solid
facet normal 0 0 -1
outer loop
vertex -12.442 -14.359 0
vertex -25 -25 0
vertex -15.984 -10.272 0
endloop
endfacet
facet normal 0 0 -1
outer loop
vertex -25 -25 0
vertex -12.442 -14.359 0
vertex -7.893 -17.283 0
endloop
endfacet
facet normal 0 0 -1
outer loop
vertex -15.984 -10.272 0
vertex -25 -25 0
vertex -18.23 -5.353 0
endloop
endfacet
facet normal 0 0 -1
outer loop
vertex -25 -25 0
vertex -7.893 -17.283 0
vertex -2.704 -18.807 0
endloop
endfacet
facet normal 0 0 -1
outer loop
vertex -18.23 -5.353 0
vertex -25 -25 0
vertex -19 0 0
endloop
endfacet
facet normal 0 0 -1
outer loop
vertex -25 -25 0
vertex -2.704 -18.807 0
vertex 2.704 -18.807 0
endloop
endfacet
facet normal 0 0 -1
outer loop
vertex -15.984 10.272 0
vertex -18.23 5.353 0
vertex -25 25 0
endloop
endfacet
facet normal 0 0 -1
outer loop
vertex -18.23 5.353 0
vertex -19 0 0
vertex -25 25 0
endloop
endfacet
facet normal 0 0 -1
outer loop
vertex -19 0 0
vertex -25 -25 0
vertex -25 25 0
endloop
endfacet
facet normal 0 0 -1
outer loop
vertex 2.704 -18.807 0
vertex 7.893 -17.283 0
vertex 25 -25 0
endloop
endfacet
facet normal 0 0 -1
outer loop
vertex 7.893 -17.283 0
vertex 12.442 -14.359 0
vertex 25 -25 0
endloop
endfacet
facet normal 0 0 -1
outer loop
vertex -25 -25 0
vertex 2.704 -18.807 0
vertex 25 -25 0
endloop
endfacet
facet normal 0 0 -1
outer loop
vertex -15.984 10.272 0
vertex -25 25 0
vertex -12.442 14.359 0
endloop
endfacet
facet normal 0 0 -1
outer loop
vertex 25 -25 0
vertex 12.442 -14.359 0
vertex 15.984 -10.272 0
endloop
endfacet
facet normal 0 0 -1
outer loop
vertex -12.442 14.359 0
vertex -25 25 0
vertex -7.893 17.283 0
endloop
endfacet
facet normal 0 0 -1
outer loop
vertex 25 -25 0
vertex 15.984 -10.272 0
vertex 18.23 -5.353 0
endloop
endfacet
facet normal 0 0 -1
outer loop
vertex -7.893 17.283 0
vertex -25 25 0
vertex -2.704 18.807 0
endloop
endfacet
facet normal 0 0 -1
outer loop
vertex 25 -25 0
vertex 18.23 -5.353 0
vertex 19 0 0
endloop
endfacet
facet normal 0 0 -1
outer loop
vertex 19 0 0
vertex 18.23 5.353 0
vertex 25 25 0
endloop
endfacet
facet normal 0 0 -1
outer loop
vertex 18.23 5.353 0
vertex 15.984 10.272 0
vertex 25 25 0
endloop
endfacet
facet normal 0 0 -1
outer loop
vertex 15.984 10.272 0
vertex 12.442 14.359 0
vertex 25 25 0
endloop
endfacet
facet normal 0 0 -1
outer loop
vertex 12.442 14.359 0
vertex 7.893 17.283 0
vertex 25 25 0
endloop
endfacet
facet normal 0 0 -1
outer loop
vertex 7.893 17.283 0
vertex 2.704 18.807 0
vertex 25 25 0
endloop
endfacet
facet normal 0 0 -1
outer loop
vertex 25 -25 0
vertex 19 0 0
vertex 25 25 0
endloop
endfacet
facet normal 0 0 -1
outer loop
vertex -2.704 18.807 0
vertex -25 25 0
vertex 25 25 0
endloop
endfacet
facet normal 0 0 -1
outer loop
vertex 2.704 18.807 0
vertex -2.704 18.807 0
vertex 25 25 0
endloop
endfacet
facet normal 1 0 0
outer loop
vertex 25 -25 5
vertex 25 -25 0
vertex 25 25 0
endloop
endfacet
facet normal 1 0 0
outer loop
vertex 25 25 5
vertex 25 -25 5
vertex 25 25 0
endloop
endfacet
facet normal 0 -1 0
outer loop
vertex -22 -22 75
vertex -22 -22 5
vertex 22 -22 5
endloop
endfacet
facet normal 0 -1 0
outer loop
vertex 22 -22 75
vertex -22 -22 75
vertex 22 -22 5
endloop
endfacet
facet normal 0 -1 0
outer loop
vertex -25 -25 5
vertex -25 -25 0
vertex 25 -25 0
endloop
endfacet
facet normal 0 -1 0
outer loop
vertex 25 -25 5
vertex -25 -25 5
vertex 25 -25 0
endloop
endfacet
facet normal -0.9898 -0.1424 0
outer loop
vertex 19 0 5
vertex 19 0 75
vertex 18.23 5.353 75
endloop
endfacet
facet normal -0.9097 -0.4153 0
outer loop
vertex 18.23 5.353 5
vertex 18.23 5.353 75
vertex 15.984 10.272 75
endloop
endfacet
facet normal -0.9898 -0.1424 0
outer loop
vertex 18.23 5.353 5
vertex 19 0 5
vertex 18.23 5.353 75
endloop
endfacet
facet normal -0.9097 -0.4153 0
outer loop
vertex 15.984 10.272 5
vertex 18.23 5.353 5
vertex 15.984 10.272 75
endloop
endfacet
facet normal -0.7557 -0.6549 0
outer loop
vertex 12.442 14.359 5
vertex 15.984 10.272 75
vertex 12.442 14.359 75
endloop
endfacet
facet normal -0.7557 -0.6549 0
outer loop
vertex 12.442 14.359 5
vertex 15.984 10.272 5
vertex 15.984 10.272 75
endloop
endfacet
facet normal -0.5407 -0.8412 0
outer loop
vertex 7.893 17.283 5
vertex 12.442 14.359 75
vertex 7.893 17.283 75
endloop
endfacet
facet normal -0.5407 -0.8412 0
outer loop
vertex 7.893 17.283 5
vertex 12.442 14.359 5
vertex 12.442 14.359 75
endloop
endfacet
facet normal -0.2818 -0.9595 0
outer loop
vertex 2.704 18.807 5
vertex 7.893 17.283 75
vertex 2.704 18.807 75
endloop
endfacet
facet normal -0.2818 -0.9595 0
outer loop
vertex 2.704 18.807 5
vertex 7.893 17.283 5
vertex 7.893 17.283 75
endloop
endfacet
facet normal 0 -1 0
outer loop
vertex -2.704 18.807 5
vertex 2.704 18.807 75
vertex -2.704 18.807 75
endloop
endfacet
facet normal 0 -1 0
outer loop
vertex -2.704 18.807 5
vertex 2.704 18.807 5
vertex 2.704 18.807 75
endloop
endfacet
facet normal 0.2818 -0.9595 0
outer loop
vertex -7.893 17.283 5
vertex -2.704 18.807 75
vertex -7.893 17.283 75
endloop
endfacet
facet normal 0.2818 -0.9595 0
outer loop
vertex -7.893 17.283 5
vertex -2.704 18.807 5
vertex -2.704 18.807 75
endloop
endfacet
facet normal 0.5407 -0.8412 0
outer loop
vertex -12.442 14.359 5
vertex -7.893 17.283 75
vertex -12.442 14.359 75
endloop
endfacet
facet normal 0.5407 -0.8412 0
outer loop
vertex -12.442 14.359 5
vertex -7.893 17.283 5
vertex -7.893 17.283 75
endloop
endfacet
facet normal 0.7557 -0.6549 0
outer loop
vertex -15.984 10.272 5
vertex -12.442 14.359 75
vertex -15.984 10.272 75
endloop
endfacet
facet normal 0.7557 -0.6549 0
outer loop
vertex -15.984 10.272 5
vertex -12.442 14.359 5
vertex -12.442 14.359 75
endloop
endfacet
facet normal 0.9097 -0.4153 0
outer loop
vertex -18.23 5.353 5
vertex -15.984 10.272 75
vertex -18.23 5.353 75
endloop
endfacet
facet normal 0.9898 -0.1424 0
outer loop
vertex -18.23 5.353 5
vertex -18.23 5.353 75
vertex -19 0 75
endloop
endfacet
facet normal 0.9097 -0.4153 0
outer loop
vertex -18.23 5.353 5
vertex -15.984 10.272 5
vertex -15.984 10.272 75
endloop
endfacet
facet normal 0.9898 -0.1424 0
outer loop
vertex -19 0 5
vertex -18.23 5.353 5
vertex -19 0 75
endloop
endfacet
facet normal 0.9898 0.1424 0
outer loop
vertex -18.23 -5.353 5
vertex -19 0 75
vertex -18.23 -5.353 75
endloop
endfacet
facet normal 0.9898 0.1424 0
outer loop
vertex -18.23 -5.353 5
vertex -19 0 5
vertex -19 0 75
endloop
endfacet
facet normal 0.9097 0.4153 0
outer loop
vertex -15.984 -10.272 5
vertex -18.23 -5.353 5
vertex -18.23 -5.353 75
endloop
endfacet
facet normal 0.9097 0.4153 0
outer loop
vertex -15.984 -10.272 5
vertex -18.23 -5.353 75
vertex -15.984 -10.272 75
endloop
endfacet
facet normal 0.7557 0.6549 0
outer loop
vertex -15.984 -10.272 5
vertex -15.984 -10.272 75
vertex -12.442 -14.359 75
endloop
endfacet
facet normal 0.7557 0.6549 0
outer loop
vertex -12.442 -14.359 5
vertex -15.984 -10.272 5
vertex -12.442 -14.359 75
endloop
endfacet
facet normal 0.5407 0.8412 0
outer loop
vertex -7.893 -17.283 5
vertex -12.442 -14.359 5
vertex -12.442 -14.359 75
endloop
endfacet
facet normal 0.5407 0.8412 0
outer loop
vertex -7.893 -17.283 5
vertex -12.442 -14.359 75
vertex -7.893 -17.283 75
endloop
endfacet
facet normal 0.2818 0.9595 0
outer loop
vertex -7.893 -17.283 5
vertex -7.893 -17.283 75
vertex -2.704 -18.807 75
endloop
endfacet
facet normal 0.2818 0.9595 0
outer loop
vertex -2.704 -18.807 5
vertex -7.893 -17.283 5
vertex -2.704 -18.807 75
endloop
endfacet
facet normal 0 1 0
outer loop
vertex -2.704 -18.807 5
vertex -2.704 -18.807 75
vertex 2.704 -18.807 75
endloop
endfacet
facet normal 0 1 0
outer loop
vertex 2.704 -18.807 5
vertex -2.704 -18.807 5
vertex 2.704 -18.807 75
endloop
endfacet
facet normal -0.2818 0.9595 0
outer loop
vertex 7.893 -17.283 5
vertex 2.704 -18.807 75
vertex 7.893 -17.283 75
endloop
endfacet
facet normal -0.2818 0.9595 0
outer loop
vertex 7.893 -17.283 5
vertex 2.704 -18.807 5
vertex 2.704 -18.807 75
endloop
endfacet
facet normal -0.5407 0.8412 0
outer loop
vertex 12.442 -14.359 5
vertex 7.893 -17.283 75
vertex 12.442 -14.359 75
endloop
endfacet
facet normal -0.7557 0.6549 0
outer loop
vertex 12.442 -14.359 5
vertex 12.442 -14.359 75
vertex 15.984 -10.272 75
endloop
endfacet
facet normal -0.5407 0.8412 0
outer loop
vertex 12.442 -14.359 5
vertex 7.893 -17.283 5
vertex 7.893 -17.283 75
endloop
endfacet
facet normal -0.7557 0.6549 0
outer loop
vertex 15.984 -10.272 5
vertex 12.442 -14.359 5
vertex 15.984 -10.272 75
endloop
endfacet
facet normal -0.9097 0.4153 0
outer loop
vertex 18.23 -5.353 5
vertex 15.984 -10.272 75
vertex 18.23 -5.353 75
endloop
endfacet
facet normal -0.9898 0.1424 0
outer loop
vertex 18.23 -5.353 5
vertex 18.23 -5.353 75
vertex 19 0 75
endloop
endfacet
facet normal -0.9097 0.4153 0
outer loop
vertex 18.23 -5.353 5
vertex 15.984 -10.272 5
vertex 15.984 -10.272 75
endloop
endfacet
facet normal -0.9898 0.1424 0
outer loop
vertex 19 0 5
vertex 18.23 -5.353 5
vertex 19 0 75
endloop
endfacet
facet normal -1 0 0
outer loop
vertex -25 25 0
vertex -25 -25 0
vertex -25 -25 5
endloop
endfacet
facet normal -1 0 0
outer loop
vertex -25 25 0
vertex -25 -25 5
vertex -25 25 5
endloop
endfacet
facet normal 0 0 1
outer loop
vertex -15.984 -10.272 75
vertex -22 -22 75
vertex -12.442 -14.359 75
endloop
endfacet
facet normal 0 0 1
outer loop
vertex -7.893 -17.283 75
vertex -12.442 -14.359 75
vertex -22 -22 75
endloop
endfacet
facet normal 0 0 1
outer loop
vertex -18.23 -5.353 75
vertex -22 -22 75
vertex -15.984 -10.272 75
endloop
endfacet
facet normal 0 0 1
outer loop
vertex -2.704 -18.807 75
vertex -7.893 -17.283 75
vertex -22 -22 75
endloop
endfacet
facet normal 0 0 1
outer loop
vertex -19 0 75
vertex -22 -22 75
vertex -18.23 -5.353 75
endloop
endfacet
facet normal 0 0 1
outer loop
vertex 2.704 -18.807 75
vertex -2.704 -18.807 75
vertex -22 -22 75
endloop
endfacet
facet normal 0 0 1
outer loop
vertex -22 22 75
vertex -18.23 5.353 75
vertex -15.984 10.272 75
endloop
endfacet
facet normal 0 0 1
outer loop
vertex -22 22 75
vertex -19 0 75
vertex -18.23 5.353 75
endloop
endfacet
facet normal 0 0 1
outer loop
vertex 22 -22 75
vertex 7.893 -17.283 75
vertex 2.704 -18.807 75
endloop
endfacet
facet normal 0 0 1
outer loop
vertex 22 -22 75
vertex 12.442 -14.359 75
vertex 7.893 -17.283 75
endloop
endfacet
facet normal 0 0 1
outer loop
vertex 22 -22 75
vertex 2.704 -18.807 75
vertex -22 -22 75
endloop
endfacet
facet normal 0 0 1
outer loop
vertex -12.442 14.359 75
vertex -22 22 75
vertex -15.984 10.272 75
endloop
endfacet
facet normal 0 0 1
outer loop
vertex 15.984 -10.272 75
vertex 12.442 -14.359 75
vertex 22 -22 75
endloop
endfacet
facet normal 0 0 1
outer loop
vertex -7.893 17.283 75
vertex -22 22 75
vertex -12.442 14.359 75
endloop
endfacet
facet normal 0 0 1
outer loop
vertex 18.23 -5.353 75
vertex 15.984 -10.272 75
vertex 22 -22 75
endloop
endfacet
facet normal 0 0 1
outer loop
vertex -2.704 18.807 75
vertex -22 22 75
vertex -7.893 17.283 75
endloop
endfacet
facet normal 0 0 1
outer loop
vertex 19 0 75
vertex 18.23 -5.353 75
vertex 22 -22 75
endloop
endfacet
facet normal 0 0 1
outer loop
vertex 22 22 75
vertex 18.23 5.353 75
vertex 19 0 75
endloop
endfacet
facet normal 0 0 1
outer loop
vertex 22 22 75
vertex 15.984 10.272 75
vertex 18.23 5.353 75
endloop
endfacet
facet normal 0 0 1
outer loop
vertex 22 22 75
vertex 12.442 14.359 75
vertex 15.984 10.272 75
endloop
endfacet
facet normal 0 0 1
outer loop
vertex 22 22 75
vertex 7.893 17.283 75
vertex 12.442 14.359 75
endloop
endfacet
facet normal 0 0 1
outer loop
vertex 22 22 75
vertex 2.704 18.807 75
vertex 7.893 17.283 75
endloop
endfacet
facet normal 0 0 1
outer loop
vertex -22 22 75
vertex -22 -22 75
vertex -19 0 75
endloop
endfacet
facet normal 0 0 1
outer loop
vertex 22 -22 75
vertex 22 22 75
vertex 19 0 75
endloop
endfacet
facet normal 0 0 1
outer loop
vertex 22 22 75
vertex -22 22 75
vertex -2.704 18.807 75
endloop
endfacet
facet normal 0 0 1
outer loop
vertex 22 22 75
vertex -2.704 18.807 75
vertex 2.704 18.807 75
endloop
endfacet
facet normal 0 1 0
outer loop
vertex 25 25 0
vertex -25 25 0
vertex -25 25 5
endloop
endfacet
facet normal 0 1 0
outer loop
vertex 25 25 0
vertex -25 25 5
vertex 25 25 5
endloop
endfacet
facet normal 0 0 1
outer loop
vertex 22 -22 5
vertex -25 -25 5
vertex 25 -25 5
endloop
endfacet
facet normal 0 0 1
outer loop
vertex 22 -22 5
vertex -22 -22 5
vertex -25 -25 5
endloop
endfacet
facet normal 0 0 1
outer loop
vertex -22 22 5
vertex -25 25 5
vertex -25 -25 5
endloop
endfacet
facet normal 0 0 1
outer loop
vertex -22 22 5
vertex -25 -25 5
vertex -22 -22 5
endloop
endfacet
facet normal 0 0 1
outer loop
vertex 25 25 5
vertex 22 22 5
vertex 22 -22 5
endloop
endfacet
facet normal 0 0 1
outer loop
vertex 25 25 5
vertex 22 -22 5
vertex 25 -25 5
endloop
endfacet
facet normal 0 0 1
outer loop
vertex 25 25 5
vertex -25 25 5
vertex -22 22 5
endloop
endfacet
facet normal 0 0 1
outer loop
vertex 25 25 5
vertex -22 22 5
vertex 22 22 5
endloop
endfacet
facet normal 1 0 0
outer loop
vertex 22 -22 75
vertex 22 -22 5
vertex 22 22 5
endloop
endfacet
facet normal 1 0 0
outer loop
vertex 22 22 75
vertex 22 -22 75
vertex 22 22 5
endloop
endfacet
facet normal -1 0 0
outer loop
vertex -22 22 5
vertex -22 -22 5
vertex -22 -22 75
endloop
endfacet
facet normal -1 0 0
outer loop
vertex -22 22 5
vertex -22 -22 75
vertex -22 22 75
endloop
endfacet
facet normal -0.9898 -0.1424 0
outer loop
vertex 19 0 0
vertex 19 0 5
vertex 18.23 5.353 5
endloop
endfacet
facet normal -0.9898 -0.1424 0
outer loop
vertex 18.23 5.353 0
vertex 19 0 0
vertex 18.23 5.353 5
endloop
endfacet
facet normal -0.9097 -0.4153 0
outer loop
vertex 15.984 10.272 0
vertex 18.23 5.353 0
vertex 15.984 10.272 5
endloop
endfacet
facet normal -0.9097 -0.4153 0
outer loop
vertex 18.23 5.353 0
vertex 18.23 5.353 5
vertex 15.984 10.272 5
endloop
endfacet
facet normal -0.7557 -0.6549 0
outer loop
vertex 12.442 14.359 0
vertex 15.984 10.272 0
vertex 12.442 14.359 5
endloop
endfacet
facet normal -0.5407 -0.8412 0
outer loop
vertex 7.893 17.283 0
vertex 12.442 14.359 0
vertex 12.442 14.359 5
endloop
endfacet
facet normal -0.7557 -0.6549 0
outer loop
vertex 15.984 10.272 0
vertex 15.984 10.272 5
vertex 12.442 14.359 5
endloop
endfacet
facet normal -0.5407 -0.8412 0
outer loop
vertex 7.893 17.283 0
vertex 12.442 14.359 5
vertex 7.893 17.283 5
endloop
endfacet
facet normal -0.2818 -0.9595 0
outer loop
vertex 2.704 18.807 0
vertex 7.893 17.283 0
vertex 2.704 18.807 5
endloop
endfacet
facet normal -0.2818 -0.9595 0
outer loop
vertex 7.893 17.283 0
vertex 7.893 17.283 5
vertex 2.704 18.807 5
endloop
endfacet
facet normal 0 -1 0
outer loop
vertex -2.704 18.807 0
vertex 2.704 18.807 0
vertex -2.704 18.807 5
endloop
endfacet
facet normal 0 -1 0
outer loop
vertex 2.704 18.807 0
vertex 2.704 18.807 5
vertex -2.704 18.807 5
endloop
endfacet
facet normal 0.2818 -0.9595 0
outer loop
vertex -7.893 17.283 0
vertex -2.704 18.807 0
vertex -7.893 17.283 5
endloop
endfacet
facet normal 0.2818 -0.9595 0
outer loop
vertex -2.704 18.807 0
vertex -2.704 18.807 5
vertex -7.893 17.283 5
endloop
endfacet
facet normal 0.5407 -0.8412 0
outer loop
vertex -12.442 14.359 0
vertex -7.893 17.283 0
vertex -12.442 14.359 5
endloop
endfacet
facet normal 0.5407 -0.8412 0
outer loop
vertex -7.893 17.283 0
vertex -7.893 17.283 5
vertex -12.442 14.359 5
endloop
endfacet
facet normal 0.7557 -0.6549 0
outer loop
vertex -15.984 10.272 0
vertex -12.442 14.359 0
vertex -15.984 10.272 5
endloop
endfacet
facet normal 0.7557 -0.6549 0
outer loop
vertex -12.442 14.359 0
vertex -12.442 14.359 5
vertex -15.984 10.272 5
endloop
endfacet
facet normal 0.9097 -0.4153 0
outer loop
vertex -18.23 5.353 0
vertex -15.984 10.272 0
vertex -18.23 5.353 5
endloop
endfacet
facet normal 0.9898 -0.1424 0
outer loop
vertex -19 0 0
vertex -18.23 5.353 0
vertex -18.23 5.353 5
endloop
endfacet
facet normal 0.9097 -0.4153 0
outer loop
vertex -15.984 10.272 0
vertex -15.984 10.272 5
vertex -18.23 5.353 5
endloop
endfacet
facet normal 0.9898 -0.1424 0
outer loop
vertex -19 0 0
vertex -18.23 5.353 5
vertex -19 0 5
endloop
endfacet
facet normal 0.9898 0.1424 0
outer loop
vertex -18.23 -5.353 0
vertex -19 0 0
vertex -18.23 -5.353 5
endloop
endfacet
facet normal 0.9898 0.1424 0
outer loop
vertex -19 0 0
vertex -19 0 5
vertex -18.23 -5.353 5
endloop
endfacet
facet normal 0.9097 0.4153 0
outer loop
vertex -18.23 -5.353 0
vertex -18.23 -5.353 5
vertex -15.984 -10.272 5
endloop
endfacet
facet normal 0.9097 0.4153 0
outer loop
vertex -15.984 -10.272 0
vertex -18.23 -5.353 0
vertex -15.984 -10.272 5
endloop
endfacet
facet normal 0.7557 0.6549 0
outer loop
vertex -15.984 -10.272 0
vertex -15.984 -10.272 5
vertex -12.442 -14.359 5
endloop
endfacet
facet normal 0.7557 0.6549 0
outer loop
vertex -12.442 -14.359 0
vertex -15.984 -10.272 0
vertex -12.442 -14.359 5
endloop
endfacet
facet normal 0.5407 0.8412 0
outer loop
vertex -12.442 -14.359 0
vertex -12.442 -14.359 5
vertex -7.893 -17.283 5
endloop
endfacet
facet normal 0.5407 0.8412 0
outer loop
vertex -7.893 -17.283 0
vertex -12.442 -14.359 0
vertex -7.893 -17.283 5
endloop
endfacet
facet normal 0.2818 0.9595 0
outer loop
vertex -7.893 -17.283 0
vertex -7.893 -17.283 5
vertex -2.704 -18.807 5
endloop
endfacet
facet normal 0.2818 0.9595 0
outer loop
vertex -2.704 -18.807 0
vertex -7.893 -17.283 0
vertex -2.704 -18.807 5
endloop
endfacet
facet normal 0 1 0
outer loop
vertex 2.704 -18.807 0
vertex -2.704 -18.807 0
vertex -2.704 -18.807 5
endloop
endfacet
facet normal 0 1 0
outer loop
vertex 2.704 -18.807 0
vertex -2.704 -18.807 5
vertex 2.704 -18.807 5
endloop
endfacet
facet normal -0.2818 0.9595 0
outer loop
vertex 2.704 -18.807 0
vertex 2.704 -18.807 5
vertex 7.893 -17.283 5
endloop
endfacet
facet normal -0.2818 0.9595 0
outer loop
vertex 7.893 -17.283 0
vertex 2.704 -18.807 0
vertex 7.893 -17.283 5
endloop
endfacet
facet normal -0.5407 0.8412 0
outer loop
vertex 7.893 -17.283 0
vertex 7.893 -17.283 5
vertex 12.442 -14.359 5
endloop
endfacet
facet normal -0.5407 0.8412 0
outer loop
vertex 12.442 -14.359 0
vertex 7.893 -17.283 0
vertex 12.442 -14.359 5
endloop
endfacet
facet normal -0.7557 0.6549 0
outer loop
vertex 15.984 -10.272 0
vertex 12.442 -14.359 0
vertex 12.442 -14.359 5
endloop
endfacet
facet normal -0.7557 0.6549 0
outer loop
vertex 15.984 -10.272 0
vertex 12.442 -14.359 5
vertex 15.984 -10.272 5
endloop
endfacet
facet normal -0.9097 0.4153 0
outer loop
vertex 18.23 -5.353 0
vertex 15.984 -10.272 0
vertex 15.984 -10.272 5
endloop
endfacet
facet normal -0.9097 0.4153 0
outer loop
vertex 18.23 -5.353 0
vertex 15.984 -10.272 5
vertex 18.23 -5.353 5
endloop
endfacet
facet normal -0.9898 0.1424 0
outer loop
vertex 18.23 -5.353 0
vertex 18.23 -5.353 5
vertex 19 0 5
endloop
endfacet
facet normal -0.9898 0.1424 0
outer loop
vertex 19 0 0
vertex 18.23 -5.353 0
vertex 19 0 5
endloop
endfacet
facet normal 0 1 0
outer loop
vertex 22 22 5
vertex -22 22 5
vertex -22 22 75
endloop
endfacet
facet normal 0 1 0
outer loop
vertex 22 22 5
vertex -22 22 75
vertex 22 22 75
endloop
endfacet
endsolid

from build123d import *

# Parameters (mm, degrees)
F0_W      = 50
F0_H      = 50
F1_DEPTH  = 5
F2_W      = 44
F2_H      = 44
F2_R      = 19
F3_DEPTH  = 70
F3_FACE_R = 19
F4_DEPTH  = 78.5


with BuildPart() as f1:
    # F0 (on Top) → F1 (new body)
    with BuildSketch(Plane.XY):
        Rectangle(F0_W, F0_H)
    extrude(amount=F1_DEPTH)

    # F2 (on face) → F3 (join)
    with BuildSketch(Plane.XY.offset(5)):
        Rectangle(F2_W, F2_H)
        Circle(F2_R, mode=Mode.SUBTRACT)
    extrude(amount=F3_DEPTH)

    # F3_face (on face) → F4 (cut)
    with BuildSketch(Plane.XY.offset(5)):
        Circle(F3_FACE_R)
    extrude(amount=-F4_DEPTH, mode=Mode.SUBTRACT)


solid = f1.part
